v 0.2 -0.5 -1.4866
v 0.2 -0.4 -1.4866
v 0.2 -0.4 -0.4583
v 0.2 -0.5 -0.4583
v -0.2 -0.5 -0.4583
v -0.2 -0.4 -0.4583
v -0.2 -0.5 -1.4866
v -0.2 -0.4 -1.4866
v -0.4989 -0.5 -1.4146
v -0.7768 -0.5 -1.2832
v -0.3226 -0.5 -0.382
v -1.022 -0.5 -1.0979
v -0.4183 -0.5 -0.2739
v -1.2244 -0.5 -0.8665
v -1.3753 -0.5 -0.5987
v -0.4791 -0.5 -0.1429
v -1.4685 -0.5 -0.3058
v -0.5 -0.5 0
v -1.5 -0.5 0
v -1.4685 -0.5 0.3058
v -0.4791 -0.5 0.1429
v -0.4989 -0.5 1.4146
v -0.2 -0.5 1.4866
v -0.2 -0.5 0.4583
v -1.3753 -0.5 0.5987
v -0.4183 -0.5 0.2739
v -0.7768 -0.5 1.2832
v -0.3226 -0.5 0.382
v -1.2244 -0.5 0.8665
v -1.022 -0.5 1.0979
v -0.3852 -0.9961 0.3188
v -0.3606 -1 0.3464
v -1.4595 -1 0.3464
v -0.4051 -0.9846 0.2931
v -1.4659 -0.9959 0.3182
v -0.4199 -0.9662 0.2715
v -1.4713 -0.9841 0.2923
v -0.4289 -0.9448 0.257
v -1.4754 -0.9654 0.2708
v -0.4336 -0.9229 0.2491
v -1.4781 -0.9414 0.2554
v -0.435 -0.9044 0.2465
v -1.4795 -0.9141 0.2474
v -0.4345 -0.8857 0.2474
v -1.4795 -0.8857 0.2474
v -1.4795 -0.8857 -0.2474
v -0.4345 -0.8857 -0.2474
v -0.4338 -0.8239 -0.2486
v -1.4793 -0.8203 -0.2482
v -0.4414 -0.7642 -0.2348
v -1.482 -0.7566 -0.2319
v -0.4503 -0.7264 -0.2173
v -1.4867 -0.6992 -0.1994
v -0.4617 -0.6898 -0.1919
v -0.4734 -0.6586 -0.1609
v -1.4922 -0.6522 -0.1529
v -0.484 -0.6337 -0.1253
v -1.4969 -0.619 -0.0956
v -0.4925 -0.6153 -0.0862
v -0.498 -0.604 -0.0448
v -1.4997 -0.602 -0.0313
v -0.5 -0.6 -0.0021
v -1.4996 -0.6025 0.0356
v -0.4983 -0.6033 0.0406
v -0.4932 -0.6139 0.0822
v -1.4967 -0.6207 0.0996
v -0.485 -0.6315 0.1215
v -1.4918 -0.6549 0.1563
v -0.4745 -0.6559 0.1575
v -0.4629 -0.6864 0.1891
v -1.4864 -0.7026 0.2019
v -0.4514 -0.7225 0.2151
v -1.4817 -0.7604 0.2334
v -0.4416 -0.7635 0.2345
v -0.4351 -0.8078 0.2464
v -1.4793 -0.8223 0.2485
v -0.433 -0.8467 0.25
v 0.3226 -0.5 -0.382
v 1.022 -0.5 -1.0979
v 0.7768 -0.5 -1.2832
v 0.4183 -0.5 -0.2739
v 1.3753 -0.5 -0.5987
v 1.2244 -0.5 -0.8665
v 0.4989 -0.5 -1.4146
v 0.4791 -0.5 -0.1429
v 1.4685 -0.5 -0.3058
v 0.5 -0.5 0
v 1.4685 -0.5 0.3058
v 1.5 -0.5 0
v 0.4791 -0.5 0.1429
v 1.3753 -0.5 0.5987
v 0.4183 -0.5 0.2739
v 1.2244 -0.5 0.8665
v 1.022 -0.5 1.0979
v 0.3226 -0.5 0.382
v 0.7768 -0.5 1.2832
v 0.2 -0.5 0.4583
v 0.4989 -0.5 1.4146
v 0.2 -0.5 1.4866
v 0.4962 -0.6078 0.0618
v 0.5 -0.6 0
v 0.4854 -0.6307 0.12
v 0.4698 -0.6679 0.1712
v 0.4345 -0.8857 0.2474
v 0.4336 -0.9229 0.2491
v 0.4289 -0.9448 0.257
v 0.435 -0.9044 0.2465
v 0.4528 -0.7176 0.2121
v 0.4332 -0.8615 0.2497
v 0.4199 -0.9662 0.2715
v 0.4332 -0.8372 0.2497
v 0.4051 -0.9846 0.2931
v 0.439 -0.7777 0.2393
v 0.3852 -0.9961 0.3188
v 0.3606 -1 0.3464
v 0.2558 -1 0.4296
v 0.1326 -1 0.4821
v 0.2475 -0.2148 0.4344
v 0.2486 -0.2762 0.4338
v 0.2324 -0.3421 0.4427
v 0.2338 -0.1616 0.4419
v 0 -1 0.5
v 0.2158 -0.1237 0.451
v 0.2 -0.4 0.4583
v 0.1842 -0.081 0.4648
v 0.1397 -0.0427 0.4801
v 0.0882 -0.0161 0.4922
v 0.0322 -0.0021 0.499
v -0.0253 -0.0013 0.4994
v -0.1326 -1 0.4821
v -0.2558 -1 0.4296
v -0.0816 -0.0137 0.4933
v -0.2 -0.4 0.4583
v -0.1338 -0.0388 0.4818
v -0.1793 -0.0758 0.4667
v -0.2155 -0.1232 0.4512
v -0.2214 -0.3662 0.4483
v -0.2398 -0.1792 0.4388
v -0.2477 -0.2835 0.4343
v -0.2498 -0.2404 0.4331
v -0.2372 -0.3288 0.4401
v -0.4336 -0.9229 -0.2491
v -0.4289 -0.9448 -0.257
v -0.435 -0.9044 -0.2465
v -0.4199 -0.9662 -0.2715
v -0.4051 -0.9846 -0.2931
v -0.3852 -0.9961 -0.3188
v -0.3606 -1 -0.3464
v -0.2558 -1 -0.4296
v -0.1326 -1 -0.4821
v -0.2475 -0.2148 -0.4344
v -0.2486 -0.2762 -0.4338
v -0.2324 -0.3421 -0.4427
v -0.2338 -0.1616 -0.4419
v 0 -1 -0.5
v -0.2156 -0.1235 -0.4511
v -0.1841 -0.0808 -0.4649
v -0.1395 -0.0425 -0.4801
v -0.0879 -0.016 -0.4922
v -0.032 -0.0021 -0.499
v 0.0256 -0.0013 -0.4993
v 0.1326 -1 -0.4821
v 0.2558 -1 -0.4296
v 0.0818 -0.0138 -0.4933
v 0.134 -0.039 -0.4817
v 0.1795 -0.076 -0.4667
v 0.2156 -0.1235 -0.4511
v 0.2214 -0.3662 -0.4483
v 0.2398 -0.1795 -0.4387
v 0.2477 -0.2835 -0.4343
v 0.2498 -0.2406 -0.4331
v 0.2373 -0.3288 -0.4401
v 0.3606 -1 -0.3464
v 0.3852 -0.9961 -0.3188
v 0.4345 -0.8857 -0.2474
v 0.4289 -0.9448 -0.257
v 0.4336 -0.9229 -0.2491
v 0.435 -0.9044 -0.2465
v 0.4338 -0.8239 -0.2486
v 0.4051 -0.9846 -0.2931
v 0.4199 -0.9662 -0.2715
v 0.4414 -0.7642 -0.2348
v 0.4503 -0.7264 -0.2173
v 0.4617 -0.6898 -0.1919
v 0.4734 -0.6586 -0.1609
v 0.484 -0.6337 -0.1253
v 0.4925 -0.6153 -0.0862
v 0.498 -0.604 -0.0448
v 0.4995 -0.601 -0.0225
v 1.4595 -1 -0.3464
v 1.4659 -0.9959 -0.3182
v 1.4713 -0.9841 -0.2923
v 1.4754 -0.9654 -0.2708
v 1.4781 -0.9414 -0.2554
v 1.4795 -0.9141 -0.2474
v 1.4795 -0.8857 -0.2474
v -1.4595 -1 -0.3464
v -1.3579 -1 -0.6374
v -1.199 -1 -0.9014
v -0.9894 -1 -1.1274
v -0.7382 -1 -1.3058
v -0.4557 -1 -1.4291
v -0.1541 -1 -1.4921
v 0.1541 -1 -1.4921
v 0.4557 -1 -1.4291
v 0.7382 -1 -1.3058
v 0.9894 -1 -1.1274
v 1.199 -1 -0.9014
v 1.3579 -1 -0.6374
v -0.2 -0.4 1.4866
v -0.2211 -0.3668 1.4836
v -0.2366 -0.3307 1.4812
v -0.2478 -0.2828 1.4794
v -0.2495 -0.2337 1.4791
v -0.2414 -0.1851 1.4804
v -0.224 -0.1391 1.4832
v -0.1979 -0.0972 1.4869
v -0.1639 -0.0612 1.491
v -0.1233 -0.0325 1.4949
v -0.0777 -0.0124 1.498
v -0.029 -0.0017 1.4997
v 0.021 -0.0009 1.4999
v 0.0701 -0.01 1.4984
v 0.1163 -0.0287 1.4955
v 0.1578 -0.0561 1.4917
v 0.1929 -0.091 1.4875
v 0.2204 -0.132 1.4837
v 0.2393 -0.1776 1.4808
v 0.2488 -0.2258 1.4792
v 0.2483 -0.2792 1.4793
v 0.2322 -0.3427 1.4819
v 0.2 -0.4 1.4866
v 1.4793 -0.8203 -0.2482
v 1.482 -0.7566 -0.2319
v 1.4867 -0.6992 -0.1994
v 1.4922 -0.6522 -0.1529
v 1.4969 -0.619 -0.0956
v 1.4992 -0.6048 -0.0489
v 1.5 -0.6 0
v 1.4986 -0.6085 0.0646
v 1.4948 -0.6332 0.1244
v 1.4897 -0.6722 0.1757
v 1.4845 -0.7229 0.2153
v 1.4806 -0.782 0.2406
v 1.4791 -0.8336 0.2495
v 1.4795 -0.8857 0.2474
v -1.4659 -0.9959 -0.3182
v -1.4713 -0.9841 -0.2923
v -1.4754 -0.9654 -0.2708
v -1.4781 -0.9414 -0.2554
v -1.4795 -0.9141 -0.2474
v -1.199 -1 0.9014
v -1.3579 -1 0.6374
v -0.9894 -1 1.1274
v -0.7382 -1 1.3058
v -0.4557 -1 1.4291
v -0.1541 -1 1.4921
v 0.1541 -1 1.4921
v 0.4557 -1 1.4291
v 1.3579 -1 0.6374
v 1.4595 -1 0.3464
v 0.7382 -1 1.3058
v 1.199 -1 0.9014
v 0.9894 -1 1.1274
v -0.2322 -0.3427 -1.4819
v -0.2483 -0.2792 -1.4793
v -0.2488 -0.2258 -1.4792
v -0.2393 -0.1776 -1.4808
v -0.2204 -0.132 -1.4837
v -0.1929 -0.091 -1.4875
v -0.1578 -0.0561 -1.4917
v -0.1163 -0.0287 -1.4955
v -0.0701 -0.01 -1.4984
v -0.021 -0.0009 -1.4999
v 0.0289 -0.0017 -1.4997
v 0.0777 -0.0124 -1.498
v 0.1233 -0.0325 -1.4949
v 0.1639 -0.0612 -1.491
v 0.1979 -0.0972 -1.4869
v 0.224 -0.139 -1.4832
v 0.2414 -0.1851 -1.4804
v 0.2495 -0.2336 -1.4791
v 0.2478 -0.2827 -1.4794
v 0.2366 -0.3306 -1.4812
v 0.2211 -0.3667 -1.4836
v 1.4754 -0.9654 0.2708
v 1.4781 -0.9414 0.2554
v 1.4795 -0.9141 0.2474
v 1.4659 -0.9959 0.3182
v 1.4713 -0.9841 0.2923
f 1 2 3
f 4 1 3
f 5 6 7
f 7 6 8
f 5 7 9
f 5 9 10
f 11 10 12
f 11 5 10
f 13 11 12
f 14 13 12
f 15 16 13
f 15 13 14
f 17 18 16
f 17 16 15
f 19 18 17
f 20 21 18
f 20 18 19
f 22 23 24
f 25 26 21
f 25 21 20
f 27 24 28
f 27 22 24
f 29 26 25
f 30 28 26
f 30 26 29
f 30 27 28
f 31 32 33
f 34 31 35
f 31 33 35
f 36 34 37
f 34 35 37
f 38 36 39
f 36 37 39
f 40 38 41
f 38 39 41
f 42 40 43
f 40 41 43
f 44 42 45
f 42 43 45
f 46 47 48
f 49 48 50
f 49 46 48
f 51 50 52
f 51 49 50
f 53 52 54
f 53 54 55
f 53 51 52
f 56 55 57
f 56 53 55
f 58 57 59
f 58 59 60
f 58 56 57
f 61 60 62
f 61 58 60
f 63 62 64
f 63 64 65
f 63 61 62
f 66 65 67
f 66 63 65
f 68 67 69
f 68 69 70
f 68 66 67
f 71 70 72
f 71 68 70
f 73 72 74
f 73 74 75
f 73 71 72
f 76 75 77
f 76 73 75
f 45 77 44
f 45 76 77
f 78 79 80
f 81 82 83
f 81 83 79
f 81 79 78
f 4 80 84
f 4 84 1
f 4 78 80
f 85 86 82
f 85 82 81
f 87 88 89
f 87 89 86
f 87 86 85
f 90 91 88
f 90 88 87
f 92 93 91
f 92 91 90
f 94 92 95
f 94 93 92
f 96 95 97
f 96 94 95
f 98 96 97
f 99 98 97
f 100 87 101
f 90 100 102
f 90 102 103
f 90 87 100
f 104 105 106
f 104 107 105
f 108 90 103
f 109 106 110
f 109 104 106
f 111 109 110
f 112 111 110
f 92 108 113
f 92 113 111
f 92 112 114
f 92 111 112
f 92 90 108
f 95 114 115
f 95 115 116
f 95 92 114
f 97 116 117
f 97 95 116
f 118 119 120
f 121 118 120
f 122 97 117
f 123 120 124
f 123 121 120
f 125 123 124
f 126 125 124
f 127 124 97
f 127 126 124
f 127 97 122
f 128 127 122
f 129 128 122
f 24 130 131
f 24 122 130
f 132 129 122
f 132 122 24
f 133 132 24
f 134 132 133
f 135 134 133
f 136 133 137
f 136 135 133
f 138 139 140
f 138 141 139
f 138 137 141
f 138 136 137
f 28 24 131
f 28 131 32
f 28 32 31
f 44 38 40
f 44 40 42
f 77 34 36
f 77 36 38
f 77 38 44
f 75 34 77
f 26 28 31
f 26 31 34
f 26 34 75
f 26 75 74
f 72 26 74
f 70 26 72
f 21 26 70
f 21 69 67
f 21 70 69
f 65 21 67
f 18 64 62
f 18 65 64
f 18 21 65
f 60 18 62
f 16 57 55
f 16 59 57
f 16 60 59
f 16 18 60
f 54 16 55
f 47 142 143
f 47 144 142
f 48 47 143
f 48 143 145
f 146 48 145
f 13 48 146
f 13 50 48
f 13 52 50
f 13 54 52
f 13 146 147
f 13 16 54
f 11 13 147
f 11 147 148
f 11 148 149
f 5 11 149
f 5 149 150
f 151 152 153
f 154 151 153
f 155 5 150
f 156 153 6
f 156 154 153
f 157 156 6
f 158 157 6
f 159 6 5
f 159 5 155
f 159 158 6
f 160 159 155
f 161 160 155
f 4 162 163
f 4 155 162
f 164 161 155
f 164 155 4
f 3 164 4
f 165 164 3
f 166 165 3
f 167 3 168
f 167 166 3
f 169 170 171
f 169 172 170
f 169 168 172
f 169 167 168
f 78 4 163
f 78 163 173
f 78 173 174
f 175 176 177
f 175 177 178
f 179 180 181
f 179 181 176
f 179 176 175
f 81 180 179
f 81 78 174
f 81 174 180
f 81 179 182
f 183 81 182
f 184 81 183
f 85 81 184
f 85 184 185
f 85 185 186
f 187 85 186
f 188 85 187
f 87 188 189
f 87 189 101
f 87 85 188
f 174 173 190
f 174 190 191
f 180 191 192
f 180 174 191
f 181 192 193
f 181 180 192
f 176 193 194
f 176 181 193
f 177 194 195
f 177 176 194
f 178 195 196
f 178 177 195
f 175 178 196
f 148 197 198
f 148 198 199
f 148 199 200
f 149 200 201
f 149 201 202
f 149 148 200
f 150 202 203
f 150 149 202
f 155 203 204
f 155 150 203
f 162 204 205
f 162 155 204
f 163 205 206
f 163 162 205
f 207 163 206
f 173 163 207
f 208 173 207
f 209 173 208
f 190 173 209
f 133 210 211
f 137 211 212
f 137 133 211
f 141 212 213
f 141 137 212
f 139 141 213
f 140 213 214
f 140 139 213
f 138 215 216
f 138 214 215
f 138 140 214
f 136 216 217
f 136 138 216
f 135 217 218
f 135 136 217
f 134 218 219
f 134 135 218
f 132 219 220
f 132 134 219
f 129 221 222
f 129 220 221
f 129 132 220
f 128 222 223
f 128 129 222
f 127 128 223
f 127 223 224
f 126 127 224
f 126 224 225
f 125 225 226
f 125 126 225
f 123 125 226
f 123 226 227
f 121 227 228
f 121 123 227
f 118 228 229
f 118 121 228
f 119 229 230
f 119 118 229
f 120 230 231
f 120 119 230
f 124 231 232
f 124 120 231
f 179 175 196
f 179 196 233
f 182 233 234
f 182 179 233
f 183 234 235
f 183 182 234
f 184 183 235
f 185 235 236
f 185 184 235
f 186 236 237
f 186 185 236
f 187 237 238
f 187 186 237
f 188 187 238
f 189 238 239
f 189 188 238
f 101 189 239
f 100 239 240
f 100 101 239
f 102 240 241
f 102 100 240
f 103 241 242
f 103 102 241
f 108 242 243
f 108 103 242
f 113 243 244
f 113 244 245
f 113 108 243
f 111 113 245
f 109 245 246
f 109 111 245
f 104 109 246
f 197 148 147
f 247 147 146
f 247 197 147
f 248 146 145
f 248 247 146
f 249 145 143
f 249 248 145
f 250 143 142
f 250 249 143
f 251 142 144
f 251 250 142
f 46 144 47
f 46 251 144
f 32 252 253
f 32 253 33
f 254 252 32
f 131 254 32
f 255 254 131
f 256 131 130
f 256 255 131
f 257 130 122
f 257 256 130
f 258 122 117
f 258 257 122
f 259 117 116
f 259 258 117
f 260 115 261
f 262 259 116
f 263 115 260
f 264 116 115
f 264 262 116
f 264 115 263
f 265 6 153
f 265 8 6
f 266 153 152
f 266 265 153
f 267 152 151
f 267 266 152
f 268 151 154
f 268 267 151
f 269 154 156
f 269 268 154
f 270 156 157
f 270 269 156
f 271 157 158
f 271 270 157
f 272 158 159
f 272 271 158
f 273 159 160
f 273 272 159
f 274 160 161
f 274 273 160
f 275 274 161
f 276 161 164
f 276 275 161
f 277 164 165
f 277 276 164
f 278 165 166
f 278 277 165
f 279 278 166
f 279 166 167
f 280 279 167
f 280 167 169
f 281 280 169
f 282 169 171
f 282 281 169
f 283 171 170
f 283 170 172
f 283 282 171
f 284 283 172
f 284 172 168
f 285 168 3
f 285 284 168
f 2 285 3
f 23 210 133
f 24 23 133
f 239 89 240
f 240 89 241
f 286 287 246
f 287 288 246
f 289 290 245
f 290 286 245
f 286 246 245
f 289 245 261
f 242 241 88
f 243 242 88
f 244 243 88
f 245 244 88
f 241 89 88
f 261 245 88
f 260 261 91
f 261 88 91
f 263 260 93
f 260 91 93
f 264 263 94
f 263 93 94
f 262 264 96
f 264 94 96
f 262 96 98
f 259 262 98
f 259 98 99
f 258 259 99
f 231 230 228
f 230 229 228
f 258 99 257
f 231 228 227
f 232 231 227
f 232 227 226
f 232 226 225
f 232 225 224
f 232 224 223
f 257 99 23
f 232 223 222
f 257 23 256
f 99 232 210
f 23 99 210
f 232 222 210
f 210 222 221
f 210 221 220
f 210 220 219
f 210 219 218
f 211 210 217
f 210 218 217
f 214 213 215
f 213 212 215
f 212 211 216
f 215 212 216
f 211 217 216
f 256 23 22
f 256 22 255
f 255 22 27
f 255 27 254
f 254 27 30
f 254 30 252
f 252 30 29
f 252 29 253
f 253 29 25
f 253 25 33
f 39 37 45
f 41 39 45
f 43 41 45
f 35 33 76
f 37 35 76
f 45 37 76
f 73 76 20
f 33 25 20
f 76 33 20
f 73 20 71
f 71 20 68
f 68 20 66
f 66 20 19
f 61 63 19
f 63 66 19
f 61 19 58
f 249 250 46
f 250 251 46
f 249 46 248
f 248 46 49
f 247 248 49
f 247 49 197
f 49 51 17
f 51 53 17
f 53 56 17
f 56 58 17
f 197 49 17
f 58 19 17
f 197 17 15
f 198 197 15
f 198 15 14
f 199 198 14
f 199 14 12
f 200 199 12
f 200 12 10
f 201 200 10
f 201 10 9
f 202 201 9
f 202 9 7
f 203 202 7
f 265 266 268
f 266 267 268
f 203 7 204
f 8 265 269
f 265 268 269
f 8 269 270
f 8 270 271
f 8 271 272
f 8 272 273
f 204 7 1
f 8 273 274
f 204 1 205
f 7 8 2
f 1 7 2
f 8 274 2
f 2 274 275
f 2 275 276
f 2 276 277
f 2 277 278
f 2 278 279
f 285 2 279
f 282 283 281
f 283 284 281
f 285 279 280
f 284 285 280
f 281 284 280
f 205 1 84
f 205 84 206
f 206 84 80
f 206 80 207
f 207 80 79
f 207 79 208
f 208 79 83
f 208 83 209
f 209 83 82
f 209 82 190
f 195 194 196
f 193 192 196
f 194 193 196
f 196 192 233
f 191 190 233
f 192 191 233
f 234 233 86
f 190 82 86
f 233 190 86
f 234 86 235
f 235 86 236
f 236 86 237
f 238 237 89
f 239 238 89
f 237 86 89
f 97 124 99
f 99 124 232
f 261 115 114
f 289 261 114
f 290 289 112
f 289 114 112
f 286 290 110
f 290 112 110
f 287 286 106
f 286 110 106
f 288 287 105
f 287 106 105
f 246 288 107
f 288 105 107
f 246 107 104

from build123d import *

# Parameters (mm, degrees)
F0_R          = 1.5
F1_DEPTH      = 1
F3_DEPTH      = 1.501
F3_DEPTH_BACK = 25
F4_R          = 0.25
F5_DEPTH      = 1.5010001
F5_DEPTH_BACK = 25
F6_T1_DEPTH   = 3.705264557
F7_R          = 0.5
F8_DEPTH      = 1.0010001
F10_DEPTH     = 0.1


# Not quite as in the source:
# - a fillet or chamfer that OpenCascade refuses, or shapes differently, is made with other operations: its cross-section is extruded or revolved along the edge and cut away or added


with BuildPart() as f1:
    # F0 (on Front) → F1 (new body)
    with BuildSketch(Plane.XZ):
        Circle(F0_R)
    extrude(amount=F1_DEPTH)

    # F2 (on Top) → F3 (cut, two sides)
    with BuildSketch(Plane.XY) as f3_sk:
        with BuildLine():
            ThreePointArc((-0.2, -0.4), (0, 0), (0.2, -0.4))
            Line((0.2, -0.4), (1.99, -0.4))
            Line((1.99, -0.4), (1.99, 0.99))
            Line((1.99, 0.99), (-1.99, 0.99))
            Line((-1.99, 0.99), (-1.99, -0.4))
            Line((-1.99, -0.4), (-0.2, -0.4))
        make_face()
    extrude(amount=-F3_DEPTH, mode=Mode.SUBTRACT)
    extrude(f3_sk.sketch, amount=F3_DEPTH_BACK, mode=Mode.SUBTRACT)

    # F4 (on Right) → F5 (cut, two sides)
    with BuildSketch(Plane.YZ) as f5_sk:
        with Locations((-0.85, 0)):
            Circle(F4_R)
    extrude(amount=-F5_DEPTH, mode=Mode.SUBTRACT)
    extrude(f5_sk.sketch, amount=F5_DEPTH_BACK, mode=Mode.SUBTRACT)

    # F6: fillet of radius 0.1 on 2 edges, made by hand

    # F6_s2 → F6_t1 (cut)
    with BuildSketch(Plane.YZ.offset(-1.8526322785)):
        with BuildLine():
            ThreePointArc((-1, -0.3464101615), (-0.9654653671, -0.2708172669), (-0.8857142857, -0.2474358297))
            ThreePointArc((-0.8857142857, -0.2474358297), (-0.9458383455, -0.2309004364), (-1, -0.2))
            Line((-1, -0.2), (-1, -0.3464101615))
        make_face()
        with BuildLine():
            ThreePointArc((-1, 0.3464101615), (-0.9654653671, 0.2708172669), (-0.8857142857, 0.2474358297))
            ThreePointArc((-0.8857142857, 0.2474358297), (-0.9458383455, 0.2309004364), (-1, 0.2))
            Line((-1, 0.2), (-1, 0.3464101615))
        make_face()
    extrude(amount=F6_T1_DEPTH, mode=Mode.SUBTRACT)

    # F7 (on Front) → F8 (cut, through all)
    with BuildSketch(Plane.XZ):
        Circle(F7_R)
    extrude(amount=F8_DEPTH, mode=Mode.SUBTRACT)

    # F9 (on face) → F10 (cut)
    with BuildSketch(Plane(origin=(0, -0.4, 0), x_dir=(-1, 0, 0), z_dir=(0, 1, 0))):
        with BuildLine():
            ThreePointArc((0.2, 0.4582575695), (0.5, 0), (0.2, -0.4582575695))
            Line((0.2, -0.4582575695), (0.2, -1.4866068747))
            ThreePointArc((0.2, -1.4866068747), (1.5, 0), (0.2, 1.4866068747))
            Line((0.2, 1.4866068747), (0.2, 0.4582575695))
        make_face()
        with BuildLine():
            ThreePointArc((-0.2, -0.4582575695), (-0.5, 0), (-0.2, 0.4582575695))
            Line((-0.2, 0.4582575695), (-0.2, 1.4866068747))
            ThreePointArc((-0.2, 1.4866068747), (-1.5, 0), (-0.2, -1.4866068747))
            Line((-0.2, -1.4866068747), (-0.2, -0.4582575695))
        make_face()
    extrude(amount=-F10_DEPTH, mode=Mode.SUBTRACT)


solid = f1.part
